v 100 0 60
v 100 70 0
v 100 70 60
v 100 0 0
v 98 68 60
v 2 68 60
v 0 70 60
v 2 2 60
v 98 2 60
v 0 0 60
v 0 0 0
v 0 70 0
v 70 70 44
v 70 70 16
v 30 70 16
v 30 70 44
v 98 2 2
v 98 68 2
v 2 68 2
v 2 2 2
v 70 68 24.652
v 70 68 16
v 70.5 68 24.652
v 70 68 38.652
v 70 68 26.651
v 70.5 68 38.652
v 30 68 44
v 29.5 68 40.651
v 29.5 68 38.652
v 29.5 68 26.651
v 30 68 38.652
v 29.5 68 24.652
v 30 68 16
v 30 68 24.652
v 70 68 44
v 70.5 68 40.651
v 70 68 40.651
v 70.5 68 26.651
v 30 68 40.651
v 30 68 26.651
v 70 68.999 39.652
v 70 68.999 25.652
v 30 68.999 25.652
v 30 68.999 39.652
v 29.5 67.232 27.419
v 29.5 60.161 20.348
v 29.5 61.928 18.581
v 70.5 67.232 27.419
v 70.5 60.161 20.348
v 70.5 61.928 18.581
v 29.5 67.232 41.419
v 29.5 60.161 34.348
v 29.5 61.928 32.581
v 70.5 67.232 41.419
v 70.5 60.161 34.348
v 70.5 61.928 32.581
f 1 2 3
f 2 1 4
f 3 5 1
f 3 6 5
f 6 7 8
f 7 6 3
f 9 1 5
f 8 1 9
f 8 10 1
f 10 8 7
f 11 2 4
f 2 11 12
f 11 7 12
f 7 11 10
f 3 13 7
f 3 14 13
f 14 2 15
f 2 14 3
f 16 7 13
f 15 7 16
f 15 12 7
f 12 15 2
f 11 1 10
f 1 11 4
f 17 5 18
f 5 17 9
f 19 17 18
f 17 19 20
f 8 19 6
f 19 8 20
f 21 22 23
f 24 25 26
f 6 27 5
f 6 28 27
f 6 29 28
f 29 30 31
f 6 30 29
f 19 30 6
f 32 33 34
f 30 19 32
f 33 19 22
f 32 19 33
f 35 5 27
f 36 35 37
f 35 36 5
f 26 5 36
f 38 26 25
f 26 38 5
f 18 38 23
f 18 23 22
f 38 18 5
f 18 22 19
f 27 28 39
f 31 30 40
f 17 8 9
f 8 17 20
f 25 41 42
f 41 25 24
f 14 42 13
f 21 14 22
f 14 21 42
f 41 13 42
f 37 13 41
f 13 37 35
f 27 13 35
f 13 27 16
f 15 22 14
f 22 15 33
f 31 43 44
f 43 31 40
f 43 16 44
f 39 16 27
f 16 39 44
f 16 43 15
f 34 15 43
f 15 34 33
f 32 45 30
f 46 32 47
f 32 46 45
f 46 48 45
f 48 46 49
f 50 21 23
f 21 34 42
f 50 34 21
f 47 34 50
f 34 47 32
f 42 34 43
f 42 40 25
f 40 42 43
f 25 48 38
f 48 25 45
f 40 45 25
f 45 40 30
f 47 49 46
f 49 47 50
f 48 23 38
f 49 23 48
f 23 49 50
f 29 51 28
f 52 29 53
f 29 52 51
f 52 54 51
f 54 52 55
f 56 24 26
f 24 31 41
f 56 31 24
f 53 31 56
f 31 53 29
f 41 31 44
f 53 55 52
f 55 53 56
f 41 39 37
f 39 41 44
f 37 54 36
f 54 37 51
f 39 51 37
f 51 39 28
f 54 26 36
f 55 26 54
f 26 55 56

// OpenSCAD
$fn = 32;

// ----------------------------------------------------------------------
// Vent box: louvers enclosure
// ----------------------------------------------------------------------

// --- parameters (mm) ---
box_l = 100;              // box length, X
box_w = 70;               // box width, Y
box_h = 60;               // box height, Z
wall_t = 2;               // shell wall thickness
win_l = 40;               // vent window width, X
win_h = 28;               // vent window height, Z
slat_t = 2.5;             // louver slat thickness
slat_d = 10;              // louver slat depth
slat_a = 45;              // louver slat angle, degrees
slat_pitch = 14;          // louver pitch
slat_yc = 64.58;          // slat centreline Y

win_z0 = (box_h - win_h) / 2;  // window lower edge Z
n_slats = 2;  // louver count
slat_z0 = win_z0 + (win_h - (n_slats - 1) * slat_pitch) / 2;

difference() {
  union() {
    difference() {
      cube([box_l, box_w, box_h]);
  translate([wall_t, wall_t, wall_t])
    cube([box_l - 2 * wall_t, box_w - 2 * wall_t, box_h]);
  translate([(box_l - win_l) / 2, box_w - wall_t - 1, win_z0])
    cube([win_l, wall_t + 2, win_h]);
    }
    for (i = [0 : n_slats - 1])
      translate([box_l / 2, slat_yc, slat_z0 + i * slat_pitch])
        rotate([slat_a, 0, 0])
          cube([win_l + 1, slat_d, slat_t], center = true);
  }
}
